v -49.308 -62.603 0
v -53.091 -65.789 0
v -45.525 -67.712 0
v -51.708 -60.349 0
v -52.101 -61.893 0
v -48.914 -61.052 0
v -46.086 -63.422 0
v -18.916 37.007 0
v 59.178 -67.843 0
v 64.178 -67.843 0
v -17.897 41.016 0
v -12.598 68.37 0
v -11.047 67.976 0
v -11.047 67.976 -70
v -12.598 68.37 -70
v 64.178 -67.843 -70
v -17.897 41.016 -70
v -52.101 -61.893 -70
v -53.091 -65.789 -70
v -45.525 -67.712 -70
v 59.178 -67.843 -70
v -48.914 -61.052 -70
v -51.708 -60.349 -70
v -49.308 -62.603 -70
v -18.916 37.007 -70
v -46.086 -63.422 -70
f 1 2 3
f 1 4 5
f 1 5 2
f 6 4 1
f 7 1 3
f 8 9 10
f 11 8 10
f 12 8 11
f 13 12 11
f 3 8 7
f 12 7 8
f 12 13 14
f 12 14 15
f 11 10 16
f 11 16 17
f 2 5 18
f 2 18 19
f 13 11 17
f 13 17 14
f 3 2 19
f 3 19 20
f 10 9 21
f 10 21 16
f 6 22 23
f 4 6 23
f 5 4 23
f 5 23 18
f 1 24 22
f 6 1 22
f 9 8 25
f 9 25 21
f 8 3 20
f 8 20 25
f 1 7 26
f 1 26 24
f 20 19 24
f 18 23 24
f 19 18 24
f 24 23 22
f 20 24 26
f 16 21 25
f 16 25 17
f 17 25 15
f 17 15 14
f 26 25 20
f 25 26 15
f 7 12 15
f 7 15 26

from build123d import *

# Parameters (mm, degrees)
F1_DEPTH = 70


with BuildPart() as f1:
    # F0 (on Top) → F1 (new body)
    with BuildSketch(Plane.XY):
        Polygon((-53.090672, -65.789246), (-45.524913, -67.711686), (-18.916096, 37.007269), (59.177905, -67.84258), (64.177905, -67.84258), (-17.897495, 41.015974), (-11.04691, 67.976439), (-12.597631, 68.370474), (-46.085725, -63.421866), (-49.307792, -62.603147), (-48.913758, -61.052425), (-51.708323, -60.349014), (-52.100763, -61.89346), align=None)
    extrude(amount=-F1_DEPTH)


solid = f1.part
